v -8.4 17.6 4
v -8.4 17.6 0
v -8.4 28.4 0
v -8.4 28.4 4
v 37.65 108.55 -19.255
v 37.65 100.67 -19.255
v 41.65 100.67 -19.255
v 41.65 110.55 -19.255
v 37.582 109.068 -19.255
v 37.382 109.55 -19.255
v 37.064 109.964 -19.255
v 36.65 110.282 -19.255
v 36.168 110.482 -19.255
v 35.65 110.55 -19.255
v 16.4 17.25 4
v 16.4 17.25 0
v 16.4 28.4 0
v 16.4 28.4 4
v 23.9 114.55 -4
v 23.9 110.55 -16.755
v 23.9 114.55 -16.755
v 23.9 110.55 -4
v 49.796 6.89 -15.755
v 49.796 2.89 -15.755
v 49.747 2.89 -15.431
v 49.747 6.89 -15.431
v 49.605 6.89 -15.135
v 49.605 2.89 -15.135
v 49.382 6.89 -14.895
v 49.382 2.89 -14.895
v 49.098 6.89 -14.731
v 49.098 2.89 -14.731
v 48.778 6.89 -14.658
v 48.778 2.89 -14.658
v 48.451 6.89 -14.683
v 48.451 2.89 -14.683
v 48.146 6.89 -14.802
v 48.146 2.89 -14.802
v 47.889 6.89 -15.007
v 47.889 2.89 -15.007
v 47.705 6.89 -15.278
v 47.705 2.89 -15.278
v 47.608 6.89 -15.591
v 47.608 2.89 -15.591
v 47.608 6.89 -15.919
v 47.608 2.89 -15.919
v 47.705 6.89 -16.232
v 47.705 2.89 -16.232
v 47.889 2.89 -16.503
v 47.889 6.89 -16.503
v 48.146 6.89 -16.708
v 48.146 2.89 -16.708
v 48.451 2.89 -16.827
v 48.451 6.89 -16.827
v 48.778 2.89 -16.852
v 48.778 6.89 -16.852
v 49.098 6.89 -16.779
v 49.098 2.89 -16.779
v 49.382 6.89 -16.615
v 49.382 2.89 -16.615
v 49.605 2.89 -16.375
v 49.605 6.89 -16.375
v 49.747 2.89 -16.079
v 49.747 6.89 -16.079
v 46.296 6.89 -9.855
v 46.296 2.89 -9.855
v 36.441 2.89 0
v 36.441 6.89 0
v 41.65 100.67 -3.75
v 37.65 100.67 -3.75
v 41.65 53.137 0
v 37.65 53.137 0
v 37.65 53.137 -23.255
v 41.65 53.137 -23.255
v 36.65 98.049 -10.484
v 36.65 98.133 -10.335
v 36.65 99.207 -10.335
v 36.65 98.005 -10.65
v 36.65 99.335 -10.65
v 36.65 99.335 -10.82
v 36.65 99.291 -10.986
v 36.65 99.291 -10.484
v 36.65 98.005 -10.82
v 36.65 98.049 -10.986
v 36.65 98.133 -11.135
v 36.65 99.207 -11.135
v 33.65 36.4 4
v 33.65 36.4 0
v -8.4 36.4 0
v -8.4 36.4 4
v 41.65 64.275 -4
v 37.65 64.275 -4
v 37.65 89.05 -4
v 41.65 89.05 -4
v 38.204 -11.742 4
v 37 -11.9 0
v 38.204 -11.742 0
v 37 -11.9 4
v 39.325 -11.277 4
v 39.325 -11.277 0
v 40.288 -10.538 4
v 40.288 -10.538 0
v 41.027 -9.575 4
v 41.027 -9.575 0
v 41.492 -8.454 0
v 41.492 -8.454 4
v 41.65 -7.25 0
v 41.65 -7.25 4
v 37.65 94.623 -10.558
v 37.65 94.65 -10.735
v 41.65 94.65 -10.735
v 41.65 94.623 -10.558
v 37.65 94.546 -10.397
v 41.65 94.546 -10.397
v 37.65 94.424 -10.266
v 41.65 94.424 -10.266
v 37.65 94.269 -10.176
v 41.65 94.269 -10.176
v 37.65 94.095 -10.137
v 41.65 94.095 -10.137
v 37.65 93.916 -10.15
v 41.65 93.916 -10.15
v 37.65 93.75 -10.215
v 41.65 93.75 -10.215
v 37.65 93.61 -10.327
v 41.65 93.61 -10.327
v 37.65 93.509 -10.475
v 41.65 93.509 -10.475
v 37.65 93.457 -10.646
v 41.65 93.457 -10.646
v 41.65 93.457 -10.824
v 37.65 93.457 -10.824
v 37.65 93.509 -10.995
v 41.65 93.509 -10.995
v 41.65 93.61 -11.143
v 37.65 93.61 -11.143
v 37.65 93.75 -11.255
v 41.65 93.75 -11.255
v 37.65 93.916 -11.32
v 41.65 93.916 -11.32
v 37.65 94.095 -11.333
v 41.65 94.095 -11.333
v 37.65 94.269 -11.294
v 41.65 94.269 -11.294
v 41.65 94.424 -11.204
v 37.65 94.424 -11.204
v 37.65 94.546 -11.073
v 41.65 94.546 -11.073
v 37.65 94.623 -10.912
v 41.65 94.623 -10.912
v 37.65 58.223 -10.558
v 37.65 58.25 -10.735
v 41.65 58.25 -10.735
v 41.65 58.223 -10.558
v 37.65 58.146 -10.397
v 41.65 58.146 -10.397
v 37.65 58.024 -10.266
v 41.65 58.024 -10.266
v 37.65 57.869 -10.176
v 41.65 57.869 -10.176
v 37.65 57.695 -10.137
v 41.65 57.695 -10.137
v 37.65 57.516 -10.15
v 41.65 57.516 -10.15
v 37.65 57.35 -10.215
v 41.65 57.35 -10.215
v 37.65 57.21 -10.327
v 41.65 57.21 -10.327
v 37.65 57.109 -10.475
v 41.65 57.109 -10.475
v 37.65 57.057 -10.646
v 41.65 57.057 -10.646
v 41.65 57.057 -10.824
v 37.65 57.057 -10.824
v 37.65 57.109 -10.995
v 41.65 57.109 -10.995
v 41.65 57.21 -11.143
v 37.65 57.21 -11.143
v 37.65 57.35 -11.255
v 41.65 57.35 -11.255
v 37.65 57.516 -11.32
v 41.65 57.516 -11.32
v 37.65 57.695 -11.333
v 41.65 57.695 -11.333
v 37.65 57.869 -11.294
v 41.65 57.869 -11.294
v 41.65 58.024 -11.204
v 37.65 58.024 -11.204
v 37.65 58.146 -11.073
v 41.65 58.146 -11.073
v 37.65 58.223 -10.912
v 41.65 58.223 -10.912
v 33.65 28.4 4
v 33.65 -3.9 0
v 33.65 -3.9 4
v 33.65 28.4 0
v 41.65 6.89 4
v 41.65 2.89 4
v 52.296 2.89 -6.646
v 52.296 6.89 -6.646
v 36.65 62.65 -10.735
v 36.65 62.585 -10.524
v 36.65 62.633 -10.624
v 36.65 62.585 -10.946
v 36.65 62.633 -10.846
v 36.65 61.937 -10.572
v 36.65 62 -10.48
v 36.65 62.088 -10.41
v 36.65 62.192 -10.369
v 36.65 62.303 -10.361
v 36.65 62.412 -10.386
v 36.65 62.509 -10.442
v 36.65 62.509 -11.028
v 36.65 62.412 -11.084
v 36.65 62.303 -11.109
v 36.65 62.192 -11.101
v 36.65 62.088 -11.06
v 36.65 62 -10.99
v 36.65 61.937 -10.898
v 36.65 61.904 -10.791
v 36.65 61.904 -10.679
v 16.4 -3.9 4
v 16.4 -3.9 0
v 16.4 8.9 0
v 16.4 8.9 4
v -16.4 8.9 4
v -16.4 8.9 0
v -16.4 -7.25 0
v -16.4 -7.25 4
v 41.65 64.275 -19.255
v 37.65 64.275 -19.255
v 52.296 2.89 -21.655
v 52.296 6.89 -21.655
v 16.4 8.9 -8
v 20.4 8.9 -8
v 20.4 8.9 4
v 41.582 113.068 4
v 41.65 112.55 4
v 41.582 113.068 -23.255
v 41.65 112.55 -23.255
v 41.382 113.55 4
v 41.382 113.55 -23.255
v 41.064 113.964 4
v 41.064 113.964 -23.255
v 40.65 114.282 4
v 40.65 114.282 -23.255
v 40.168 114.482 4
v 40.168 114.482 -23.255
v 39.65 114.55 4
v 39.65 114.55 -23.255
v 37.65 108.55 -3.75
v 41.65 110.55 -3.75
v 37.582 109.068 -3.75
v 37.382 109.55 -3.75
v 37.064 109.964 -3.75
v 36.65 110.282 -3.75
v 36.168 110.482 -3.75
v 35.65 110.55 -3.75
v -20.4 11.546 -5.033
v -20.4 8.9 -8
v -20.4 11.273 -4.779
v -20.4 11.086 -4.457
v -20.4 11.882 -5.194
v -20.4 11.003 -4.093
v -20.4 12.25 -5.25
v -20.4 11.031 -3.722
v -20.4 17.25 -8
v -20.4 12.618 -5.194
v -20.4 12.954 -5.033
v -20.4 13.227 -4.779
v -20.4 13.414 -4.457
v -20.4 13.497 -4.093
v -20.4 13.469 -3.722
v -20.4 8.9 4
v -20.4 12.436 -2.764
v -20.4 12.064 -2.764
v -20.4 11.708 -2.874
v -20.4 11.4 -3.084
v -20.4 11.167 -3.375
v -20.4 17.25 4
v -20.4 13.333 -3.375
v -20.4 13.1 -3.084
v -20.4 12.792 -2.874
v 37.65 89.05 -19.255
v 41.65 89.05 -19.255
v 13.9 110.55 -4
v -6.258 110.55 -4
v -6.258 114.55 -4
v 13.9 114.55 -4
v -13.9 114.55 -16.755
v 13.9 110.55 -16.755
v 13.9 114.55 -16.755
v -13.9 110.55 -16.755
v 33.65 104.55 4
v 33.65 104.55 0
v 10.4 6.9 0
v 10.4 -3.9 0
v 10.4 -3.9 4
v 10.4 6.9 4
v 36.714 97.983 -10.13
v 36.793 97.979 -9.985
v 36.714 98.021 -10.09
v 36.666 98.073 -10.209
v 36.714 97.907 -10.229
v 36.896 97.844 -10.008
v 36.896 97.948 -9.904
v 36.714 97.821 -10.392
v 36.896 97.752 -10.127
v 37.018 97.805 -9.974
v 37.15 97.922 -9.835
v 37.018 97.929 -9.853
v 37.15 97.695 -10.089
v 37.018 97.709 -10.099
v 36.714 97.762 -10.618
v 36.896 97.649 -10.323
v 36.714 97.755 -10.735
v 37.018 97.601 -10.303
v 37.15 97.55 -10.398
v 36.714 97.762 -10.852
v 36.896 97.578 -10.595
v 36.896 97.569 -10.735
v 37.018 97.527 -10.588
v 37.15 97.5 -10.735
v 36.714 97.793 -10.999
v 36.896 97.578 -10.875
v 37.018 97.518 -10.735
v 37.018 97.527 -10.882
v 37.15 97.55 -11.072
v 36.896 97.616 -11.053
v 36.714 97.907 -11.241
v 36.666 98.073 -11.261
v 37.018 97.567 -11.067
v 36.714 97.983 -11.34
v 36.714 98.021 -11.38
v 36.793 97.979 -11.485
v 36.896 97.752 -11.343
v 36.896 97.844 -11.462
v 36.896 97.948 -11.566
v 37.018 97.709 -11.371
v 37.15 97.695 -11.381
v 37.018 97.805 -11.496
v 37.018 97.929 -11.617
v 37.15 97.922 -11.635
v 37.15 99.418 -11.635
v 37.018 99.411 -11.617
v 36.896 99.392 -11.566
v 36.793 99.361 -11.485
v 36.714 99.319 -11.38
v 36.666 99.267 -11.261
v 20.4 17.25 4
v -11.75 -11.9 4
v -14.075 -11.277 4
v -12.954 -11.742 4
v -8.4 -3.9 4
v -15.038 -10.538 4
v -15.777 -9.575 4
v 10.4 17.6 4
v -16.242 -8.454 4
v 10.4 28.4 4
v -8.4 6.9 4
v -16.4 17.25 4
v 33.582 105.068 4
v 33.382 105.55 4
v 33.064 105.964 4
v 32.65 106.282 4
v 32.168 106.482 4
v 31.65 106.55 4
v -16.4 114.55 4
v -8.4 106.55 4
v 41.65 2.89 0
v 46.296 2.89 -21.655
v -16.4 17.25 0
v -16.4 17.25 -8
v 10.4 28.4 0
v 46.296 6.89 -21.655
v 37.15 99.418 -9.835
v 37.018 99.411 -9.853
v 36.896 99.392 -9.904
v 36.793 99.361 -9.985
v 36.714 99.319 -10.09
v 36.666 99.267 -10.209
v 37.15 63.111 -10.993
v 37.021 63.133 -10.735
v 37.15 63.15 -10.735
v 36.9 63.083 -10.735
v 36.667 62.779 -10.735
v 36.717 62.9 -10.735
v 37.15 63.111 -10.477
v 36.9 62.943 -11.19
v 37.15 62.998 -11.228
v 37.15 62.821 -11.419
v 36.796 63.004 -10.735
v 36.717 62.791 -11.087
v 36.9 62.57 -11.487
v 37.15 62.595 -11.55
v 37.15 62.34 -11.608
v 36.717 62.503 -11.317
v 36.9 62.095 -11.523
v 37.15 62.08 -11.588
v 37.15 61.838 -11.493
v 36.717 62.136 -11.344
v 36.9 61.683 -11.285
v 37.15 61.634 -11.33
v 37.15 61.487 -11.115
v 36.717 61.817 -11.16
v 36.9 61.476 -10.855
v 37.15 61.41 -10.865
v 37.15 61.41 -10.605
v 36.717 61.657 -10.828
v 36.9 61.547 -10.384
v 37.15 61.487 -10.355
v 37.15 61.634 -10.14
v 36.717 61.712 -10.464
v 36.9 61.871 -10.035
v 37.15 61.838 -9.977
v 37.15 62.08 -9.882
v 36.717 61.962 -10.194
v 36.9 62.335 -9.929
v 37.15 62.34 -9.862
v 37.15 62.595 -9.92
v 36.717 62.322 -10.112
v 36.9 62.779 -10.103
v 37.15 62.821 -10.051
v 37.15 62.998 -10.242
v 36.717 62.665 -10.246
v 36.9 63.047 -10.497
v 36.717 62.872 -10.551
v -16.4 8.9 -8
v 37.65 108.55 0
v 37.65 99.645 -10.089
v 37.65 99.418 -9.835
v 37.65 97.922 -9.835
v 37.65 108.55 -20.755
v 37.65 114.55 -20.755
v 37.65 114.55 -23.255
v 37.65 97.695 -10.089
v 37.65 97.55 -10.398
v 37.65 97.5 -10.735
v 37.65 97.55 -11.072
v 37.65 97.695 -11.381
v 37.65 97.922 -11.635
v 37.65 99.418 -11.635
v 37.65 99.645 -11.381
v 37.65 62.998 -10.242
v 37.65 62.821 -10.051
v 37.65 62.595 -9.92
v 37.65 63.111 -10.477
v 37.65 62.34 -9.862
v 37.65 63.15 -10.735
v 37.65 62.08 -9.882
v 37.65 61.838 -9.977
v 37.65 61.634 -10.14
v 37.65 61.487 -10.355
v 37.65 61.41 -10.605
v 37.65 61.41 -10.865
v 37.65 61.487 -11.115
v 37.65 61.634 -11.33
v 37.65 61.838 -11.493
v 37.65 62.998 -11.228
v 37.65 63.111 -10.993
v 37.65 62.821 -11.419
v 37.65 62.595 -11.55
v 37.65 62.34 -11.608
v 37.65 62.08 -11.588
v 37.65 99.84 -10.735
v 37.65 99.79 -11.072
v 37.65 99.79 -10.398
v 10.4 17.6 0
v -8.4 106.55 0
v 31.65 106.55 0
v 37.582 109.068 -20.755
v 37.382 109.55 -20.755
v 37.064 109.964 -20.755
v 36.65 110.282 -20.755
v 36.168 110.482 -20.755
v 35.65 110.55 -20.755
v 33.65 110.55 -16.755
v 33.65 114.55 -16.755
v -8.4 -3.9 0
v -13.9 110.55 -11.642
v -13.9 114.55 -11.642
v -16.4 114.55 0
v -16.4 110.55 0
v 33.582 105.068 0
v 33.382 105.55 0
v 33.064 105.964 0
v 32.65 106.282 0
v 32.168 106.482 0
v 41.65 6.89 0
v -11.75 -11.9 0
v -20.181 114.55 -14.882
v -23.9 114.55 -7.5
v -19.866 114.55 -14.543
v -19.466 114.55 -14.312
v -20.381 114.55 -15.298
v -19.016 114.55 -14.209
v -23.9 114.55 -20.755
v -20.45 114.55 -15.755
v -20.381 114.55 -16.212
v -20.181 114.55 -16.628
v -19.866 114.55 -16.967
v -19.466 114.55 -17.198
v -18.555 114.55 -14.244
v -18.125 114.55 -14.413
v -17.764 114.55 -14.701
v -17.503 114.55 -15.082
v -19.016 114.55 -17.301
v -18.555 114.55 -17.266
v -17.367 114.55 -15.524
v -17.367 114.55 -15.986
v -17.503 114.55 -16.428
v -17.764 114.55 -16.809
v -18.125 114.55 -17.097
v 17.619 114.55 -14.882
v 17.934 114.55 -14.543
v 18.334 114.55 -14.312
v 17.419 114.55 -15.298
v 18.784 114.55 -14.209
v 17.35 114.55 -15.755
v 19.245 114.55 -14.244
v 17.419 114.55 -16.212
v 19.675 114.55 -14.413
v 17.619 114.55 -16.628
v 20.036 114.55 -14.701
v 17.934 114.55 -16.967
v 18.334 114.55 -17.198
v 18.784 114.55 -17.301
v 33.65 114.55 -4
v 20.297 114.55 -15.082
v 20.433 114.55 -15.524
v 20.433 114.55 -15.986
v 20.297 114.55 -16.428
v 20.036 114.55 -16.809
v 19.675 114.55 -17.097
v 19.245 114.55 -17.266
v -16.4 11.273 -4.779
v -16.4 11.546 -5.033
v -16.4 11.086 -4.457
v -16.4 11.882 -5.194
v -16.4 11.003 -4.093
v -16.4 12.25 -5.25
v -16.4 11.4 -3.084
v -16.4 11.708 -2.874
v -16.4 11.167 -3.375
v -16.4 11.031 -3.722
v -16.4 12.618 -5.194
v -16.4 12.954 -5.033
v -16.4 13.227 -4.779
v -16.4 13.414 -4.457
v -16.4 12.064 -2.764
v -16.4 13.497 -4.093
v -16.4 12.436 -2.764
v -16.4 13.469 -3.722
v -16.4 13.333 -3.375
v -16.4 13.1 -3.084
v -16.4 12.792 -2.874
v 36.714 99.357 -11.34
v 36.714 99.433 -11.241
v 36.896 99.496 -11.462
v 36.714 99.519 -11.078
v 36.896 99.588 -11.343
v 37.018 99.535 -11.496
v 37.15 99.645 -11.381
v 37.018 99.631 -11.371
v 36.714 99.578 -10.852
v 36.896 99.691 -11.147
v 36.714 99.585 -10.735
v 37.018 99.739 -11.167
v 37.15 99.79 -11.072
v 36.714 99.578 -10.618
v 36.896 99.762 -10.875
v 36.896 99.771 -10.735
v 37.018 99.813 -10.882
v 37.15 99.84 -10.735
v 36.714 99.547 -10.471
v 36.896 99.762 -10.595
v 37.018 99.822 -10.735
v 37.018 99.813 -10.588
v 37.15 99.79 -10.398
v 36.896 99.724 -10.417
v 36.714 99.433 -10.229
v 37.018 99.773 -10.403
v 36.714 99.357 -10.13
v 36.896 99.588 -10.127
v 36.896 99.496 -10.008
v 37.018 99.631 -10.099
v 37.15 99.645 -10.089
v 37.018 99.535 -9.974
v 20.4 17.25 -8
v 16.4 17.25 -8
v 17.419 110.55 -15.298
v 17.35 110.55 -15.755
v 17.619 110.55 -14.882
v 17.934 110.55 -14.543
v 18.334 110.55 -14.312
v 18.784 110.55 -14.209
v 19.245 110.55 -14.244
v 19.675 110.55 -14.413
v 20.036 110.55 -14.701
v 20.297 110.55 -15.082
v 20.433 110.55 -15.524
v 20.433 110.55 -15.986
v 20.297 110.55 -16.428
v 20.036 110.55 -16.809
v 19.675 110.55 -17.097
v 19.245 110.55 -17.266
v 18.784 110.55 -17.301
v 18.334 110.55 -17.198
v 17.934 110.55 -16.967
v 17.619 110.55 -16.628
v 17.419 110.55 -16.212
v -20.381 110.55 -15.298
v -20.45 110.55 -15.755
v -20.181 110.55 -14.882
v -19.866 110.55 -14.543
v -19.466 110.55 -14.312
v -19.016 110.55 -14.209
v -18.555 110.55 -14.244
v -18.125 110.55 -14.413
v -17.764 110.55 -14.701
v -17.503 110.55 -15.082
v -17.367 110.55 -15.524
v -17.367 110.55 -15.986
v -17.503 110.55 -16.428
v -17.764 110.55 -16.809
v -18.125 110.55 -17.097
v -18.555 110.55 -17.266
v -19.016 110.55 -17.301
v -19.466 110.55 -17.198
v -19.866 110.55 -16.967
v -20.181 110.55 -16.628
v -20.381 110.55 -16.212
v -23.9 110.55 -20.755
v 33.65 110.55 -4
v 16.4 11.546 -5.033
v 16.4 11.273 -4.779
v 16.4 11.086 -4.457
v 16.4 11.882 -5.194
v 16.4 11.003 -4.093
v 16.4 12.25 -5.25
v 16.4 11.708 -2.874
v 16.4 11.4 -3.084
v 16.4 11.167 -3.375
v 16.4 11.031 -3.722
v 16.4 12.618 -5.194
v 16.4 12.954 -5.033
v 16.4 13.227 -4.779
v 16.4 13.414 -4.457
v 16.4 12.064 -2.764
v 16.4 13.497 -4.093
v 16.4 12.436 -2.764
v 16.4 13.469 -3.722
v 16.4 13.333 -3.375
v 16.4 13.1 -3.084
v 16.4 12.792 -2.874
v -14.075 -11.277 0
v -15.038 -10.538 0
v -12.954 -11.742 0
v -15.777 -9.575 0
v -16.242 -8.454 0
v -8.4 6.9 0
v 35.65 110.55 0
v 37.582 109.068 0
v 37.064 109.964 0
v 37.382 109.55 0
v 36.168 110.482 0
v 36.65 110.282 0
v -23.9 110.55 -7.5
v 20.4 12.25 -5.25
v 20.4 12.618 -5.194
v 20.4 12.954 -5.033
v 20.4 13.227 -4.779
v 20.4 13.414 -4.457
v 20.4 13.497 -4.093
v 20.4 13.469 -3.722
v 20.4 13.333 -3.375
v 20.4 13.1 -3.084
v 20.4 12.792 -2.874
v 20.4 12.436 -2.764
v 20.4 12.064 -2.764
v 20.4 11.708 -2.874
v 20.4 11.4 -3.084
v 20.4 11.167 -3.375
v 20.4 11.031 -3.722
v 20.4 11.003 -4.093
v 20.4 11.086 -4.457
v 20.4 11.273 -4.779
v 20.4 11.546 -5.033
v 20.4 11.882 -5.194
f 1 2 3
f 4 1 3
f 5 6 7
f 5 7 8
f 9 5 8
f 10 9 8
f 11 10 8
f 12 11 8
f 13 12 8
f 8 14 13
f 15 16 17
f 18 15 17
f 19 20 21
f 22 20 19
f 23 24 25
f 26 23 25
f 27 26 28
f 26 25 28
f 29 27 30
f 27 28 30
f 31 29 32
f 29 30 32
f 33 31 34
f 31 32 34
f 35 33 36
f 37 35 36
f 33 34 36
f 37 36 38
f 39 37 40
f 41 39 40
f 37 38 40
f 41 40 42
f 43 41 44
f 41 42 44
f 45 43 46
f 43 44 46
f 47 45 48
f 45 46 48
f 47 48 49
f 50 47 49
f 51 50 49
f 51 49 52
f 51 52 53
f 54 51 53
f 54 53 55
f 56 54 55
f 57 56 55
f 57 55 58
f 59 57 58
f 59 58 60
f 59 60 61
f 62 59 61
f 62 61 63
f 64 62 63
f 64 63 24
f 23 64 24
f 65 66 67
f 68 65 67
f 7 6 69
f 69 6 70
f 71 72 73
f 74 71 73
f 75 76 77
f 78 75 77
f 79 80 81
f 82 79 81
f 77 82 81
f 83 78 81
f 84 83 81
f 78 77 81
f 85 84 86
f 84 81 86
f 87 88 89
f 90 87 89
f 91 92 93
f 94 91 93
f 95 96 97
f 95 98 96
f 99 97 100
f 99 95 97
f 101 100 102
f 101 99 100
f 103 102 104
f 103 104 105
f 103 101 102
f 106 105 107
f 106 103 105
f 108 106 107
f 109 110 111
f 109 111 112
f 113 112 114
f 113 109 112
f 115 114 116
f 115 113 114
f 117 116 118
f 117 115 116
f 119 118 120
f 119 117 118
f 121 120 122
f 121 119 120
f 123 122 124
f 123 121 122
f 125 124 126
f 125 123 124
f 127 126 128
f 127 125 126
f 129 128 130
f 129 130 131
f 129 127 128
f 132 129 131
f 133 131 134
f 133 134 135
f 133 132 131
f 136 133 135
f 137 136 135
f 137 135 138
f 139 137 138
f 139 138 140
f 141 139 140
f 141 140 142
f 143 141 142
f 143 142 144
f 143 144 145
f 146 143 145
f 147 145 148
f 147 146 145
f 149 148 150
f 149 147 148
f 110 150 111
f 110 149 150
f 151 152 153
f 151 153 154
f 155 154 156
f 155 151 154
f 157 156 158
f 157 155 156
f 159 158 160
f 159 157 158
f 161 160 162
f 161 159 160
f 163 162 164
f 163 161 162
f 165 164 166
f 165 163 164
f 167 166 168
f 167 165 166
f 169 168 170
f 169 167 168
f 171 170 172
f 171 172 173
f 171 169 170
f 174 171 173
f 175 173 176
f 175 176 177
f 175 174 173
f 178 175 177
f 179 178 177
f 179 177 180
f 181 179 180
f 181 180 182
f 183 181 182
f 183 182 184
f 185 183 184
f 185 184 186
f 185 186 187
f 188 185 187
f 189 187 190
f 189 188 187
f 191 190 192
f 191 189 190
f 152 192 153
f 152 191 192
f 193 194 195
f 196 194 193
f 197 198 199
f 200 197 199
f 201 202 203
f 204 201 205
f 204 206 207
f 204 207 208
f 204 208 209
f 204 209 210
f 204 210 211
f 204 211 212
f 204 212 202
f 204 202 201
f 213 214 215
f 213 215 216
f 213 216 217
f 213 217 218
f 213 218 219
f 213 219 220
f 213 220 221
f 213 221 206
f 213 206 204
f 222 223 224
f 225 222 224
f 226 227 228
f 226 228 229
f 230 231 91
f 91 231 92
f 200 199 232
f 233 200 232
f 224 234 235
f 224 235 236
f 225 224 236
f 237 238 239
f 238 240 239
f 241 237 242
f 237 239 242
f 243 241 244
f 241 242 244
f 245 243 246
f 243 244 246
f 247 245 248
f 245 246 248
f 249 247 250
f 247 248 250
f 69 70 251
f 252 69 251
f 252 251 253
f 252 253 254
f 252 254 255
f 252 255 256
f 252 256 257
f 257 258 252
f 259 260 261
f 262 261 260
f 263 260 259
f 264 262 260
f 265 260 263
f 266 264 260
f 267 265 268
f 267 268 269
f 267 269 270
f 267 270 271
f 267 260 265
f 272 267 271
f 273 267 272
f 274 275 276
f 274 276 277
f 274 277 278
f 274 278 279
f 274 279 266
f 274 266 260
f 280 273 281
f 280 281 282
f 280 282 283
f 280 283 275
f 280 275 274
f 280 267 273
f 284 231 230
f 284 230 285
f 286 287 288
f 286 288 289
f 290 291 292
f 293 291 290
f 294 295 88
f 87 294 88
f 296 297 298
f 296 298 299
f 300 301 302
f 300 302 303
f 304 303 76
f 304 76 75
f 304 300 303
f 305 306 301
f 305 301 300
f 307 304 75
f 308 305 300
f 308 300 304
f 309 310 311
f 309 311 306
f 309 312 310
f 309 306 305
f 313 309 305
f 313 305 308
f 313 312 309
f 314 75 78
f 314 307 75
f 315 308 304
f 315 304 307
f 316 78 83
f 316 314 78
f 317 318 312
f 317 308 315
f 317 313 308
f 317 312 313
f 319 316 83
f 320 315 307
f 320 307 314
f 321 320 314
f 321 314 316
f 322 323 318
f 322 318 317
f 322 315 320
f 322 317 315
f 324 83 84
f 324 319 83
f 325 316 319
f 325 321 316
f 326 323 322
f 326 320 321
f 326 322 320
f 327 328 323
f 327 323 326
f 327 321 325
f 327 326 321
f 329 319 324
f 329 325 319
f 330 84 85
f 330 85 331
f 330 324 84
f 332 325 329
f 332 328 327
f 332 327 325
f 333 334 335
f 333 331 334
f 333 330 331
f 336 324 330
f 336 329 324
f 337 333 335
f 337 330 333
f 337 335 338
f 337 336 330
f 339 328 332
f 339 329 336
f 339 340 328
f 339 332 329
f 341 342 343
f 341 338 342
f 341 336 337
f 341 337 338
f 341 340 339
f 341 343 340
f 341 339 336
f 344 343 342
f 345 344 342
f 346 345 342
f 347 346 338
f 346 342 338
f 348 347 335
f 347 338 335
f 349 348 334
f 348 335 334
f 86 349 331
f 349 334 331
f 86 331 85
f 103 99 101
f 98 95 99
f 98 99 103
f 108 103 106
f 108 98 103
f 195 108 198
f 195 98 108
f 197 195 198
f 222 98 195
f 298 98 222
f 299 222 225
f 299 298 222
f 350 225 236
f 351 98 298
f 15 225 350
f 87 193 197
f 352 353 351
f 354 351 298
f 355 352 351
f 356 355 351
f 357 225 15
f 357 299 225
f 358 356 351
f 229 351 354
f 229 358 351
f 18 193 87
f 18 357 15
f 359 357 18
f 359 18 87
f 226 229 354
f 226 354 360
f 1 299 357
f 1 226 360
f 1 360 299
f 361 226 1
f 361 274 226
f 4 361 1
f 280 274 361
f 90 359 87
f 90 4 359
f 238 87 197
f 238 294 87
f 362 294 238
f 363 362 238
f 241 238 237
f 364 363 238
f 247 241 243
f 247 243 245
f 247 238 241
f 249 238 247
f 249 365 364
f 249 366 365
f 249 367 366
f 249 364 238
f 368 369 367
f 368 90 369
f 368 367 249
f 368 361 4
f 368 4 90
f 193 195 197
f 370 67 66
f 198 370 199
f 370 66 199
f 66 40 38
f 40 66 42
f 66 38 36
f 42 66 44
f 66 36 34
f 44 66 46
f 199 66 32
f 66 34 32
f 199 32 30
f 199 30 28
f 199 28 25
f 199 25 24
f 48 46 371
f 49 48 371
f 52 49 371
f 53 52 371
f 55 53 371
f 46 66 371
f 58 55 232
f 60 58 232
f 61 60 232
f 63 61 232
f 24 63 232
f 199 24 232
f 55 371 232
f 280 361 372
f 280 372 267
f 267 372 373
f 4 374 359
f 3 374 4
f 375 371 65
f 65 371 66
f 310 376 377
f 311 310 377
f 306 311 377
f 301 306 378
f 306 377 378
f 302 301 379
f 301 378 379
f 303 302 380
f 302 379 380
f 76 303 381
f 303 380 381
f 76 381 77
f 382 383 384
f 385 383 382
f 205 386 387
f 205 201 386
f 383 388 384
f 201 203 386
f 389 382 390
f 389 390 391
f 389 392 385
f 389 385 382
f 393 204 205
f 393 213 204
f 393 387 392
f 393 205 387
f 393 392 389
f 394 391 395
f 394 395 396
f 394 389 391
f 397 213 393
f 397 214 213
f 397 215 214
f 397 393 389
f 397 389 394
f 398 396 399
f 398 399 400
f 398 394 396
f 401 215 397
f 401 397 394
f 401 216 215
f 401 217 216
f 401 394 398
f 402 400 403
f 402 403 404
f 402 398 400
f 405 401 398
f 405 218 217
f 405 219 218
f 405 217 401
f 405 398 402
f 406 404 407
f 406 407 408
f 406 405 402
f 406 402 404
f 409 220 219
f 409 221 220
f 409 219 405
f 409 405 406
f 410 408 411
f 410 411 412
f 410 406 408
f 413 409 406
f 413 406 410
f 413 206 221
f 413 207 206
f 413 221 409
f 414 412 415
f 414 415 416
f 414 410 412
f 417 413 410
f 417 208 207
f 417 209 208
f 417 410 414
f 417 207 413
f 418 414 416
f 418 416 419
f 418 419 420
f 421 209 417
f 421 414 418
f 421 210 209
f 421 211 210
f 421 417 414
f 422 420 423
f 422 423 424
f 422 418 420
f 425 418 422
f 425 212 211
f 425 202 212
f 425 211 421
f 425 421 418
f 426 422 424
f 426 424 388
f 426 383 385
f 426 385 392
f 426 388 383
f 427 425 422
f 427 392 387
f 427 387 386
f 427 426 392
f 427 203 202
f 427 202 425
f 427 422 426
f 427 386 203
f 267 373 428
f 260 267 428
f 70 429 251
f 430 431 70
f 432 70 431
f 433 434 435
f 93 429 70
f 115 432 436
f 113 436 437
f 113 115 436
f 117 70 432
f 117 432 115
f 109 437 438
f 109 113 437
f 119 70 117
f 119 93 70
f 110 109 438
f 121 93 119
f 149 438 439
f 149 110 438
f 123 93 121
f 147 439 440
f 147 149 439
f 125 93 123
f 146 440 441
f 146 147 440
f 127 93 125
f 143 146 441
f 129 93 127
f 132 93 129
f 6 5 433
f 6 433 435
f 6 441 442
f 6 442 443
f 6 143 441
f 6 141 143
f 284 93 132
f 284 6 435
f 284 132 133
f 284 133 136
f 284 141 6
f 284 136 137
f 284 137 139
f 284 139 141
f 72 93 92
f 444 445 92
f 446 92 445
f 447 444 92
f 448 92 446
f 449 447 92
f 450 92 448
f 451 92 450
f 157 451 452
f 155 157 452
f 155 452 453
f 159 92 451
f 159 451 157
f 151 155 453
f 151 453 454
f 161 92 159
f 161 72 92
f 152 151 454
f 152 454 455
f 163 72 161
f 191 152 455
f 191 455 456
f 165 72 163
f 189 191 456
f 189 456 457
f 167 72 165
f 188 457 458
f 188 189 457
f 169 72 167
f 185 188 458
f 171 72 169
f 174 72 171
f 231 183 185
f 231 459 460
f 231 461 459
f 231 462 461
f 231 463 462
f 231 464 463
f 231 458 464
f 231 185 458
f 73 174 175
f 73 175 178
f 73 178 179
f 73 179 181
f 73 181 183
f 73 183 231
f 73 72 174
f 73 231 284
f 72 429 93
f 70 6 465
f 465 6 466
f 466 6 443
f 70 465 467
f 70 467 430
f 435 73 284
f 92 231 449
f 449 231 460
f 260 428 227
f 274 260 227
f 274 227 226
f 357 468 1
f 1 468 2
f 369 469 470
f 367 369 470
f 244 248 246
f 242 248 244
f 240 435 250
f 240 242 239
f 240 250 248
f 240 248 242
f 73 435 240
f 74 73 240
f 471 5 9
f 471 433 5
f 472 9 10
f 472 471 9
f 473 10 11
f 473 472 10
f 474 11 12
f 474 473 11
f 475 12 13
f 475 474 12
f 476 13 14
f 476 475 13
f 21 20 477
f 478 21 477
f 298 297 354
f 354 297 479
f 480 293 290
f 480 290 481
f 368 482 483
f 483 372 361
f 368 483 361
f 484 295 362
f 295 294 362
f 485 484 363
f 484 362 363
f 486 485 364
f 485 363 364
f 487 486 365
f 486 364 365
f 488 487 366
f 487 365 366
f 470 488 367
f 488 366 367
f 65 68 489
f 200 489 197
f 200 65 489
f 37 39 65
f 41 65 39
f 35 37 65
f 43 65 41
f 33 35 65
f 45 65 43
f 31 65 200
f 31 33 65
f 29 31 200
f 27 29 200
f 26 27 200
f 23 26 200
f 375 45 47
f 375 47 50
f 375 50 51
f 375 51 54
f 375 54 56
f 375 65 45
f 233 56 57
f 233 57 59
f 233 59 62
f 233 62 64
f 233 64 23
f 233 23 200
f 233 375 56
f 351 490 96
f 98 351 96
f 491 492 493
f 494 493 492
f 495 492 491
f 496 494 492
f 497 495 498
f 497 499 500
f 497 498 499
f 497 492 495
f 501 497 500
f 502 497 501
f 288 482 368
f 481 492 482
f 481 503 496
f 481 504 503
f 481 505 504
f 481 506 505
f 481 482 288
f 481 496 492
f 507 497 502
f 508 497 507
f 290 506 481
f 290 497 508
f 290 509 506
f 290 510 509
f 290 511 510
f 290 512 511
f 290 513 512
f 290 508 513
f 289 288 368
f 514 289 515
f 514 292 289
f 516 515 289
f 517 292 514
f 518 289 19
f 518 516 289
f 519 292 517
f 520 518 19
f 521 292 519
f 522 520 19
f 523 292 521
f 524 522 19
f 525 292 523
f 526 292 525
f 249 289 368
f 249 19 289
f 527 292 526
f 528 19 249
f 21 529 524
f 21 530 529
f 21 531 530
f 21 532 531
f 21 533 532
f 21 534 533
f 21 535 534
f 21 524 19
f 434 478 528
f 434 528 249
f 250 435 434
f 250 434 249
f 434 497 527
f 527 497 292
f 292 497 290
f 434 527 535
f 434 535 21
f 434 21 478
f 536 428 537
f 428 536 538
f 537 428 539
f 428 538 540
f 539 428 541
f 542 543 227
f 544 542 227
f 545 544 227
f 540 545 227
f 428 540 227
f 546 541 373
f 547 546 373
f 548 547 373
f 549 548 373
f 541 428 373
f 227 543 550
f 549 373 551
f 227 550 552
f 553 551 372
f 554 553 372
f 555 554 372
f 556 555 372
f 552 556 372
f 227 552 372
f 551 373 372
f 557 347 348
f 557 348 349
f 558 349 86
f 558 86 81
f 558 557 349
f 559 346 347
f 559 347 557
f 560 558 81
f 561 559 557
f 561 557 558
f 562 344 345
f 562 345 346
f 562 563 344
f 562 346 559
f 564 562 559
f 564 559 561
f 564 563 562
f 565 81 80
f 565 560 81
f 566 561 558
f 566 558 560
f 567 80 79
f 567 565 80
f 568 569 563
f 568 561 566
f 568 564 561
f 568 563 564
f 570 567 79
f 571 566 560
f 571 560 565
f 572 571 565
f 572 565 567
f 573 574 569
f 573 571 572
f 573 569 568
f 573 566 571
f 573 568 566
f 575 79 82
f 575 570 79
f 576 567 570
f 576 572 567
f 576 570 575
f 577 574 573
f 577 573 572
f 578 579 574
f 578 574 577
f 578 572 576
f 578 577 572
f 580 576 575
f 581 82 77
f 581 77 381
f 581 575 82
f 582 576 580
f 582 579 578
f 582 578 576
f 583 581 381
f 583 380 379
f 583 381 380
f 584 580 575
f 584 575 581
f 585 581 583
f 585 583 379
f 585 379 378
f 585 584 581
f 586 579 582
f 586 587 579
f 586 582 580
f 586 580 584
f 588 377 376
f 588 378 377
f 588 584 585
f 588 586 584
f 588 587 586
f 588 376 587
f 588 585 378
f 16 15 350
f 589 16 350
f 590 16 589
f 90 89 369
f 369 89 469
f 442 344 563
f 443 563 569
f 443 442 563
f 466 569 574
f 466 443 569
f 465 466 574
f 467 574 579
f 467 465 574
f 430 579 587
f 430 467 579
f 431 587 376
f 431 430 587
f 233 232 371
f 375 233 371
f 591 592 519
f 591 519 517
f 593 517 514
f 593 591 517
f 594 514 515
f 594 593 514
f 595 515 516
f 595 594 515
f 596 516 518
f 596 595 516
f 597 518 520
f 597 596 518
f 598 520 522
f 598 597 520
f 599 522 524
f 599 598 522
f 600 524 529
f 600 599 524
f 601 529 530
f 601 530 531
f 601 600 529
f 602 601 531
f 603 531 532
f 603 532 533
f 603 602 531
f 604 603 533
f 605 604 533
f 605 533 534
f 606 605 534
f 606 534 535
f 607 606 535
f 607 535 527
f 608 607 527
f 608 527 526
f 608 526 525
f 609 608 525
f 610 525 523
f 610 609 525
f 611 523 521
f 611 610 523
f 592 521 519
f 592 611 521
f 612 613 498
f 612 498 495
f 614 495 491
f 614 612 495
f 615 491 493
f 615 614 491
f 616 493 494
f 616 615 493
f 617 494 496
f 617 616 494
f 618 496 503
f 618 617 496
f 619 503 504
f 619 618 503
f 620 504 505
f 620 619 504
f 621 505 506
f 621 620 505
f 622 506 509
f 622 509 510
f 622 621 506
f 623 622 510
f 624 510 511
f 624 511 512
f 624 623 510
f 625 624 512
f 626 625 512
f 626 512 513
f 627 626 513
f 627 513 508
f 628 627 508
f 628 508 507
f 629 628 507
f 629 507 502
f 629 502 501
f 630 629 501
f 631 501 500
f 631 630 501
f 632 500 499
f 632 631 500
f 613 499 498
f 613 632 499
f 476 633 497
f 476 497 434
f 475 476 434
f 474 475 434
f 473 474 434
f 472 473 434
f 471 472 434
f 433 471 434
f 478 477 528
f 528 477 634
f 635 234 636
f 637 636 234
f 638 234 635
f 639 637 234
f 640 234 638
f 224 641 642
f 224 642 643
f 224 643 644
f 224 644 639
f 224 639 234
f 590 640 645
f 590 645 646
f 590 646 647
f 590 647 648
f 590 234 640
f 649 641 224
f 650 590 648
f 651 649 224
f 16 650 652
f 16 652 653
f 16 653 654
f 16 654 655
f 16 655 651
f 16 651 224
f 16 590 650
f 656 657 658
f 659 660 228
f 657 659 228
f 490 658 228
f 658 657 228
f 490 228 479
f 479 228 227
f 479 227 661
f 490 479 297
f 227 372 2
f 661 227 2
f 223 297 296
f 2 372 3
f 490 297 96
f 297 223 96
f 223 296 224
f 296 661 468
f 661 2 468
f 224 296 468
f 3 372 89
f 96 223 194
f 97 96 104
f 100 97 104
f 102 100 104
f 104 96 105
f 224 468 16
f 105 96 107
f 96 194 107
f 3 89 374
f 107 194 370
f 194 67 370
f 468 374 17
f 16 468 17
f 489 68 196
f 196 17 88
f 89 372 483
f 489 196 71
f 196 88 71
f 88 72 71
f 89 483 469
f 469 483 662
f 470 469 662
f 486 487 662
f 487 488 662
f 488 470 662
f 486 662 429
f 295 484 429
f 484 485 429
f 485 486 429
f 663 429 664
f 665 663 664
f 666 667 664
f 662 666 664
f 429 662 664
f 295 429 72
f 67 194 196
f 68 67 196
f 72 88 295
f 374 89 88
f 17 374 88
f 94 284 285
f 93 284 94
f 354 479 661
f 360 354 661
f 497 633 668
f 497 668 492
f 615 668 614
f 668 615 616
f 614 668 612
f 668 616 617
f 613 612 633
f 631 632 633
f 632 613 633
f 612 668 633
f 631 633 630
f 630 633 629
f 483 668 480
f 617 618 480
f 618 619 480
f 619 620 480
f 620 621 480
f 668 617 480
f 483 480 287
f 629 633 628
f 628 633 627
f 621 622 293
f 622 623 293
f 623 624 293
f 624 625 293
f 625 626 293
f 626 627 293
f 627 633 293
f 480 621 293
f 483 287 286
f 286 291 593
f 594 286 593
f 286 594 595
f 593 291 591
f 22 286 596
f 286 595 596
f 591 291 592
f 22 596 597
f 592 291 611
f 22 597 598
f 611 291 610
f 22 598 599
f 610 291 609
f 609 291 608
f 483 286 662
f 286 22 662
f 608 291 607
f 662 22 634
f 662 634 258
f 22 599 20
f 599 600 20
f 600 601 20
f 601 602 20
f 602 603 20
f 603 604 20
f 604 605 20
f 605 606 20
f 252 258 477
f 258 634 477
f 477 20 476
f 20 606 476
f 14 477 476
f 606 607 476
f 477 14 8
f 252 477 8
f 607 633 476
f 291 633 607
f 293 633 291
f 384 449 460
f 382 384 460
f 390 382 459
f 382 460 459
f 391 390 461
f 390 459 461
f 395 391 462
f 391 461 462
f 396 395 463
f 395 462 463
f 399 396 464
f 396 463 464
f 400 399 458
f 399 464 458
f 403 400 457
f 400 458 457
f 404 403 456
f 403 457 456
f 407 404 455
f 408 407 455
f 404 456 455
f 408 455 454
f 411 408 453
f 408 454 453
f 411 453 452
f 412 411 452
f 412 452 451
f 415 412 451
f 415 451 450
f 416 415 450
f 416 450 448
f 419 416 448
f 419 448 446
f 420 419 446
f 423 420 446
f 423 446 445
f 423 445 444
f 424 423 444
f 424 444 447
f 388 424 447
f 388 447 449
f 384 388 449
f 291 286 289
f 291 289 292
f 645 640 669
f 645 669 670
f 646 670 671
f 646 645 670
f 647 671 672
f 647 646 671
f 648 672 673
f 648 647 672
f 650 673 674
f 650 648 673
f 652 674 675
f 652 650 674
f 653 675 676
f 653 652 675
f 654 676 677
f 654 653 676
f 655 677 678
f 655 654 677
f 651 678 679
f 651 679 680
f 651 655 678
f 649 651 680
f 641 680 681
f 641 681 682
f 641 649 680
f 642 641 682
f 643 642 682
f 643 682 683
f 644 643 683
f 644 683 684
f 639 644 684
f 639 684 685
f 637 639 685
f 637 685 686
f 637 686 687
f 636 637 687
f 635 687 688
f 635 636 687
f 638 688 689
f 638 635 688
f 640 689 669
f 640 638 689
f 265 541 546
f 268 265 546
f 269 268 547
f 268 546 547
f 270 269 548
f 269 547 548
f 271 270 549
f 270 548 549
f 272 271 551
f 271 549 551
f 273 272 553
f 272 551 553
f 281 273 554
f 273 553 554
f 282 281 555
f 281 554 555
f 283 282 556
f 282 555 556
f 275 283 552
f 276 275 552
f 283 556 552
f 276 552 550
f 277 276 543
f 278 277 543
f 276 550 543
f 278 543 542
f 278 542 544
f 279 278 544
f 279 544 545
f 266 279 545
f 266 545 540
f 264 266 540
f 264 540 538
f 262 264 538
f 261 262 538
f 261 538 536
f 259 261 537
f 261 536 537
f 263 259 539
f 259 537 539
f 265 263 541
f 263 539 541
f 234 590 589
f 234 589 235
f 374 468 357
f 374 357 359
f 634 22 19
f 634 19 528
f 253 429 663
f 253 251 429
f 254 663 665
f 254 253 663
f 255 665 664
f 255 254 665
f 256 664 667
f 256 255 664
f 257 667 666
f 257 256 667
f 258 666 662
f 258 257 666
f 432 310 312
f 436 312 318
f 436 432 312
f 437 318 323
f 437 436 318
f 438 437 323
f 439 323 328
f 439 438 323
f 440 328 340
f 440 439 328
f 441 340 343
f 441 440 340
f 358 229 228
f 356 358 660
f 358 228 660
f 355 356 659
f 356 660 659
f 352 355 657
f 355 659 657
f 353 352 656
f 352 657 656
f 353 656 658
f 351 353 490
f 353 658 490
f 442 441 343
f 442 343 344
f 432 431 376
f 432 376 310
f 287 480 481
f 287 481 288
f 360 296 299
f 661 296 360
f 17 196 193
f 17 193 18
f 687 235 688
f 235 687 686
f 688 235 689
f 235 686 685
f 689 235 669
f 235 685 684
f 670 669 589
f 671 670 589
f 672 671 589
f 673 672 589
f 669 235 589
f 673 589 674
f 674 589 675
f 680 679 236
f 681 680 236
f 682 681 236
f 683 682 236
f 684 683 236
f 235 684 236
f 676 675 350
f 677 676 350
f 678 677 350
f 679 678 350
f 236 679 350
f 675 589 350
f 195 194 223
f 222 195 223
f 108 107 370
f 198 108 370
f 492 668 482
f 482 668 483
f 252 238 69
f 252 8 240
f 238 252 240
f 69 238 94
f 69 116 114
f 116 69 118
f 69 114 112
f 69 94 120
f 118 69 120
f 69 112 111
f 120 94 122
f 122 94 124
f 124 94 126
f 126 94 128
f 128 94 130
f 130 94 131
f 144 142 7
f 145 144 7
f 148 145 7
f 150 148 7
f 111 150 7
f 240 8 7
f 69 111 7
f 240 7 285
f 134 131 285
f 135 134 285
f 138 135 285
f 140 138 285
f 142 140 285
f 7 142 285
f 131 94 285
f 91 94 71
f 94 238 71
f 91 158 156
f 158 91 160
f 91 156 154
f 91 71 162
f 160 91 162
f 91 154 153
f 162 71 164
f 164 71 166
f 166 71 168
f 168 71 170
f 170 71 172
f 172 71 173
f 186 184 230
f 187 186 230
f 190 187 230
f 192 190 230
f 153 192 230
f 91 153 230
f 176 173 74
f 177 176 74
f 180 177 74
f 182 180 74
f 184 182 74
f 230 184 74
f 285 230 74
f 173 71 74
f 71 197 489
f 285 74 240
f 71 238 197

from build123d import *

# Parameters (mm, degrees)
SKETCH_4_W          = 23.255
SKETCH_4_H          = 57.4134
SKETCH_4_R          = 0.6
EXTRUDE_5_DEPTH     = 4
SKETCH_5_W          = 65.55
SKETCH_5_H          = 20.755
SKETCH_5_R          = 1.55
EXTRUDE_6_DEPTH     = 4
SKETCH_7_W          = 65.55
SKETCH_7_H          = 126.45
EXTRUDE_8_DEPTH     = 4
SKETCH_11_W         = 17.25
SKETCH_11_H         = 32.3
SKETCH_11_W_2       = 18.8
SKETCH_11_H_2       = 10.8
CUT_EXTRUDE_3_DEPTH = 125.085535116
EXTRUDE_9_DEPTH     = 4
CUT_EXTRUDE_4_DEPTH = 10
SKETCH_14_W         = 9.75
SKETCH_14_H         = 12.755
CUT_EXTRUDE_5_DEPTH = 10
SKETCH_16_W         = 15.255
SKETCH_16_H         = 24.775
SKETCH_16_W_2       = 15.505
SKETCH_16_H_2       = 9.88
CUT_EXTRUDE_6_DEPTH = 133.101854737
SKETCH_17_R         = 0.875
EXTRUDE_10_DEPTH    = 1
FILLET_1_R          = 0.5
EXTRUDE_2_DEPTH     = 4
CUT_EXTRUDE_7_REACH = 127.473
SKETCH_19_R         = 1.1
SKETCH_21_W         = 4
SKETCH_21_H         = 2.5
EXTRUDE_11_DEPTH    = 4
FILLET_2_R          = 2
FILLET_3_R          = 4.65


with BuildPart() as part:
    # 草图4 → 凸台-拉伸5 (new body)
    with BuildSketch(Plane(origin=(37.65, 0, 0), x_dir=(0, 0, -1), z_dir=(1, 0, 0))):
        with Locations((11.6275, 81.8433)):
            Rectangle(SKETCH_4_W, SKETCH_4_H)
        with Locations(Location((10.735, 94.05, 0), (0, 0, 90))):
            Circle(SKETCH_4_R, mode=Mode.SUBTRACT)
        with Locations(Location((10.735, 57.65, 0), (0, 0, 90))):
            Circle(SKETCH_4_R, mode=Mode.SUBTRACT)
    extrude(amount=EXTRUDE_5_DEPTH)

    # 草图5 → 凸台-拉伸6 (add)
    with BuildSketch(Plane(origin=(0, 110.55, 0), x_dir=(1, 0, 0), z_dir=(0, 1, 0))):
        with Locations((8.875, 10.3775)):
            Rectangle(SKETCH_5_W, SKETCH_5_H)
        with Locations(Location((-18.9, 15.755, 0), (0, 0, 180))):
            Circle(SKETCH_5_R, mode=Mode.SUBTRACT)
        with Locations(Location((18.9, 15.755, 0), (0, 0, 180))):
            Circle(SKETCH_5_R, mode=Mode.SUBTRACT)
    extrude(amount=EXTRUDE_6_DEPTH)

    # 草图7 → 凸台-拉伸8 (add)
    with BuildSketch(Plane.XY):
        with Locations((8.875, 51.325)):
            Rectangle(SKETCH_7_W, SKETCH_7_H)
    extrude(amount=EXTRUDE_8_DEPTH)

    # 草图11 → 切除-拉伸3 (cut, through all)
    with BuildSketch(Plane(origin=(0, 0, 0), x_dir=(-1, 0, 0), z_dir=(0, 0, -1))):
        with Locations((-25.025, 12.25)):
            Rectangle(SKETCH_11_W, SKETCH_11_H)
        Polygon((-33.65, 106.55), (-33.65, 36.4), (-16.4, 36.4), (8.4, 36.4), (8.4, 106.55), align=None)
        with Locations((-1, 1.5)):
            Rectangle(SKETCH_11_W_2, SKETCH_11_H_2)
        with Locations((-1, 23)):
            Rectangle(SKETCH_11_W_2, SKETCH_11_H_2)
        with BuildLine():
            ThreePointArc((16.4, -7.25), (15.038046533, -10.538046533), (11.75, -11.9))
            Line((11.75, -11.9), (23.9, -11.9))
            Line((23.9, -11.9), (23.9, 106.55))
            Line((23.9, 106.55), (16.4, 106.55))
            Line((16.4, 106.55), (16.4, -7.25))
        make_face()
    extrude(amount=-CUT_EXTRUDE_3_DEPTH, mode=Mode.SUBTRACT)

    # 草图12 → 凸台-拉伸9 (add)
    with BuildSketch(Plane(origin=(0, 2.890336251, 0), x_dir=(1, 0, 0), z_dir=(0, 1, 0))):
        with BuildLine():
            Line((46.295757056, 9.855), (50.995757056, 9.855))
            Line((50.995757056, 9.855), (50.995757056, 15.105))
            Line((50.995757056, 15.105), (49.455691264, 15.105))
            ThreePointArc((49.455691264, 15.105), (47.695757056, 15.755), (49.455691264, 16.405))
            Line((49.455691264, 16.405), (50.995757056, 16.405))
            Line((50.995757056, 16.405), (50.995757056, 21.655))
            Line((50.995757056, 21.655), (46.295757056, 21.655))
            Line((46.295757056, 21.655), (46.295757056, 9.855))
        make_face()
        Polygon((52.295757056, 6.645757056), (52.295757056, 9.855), (50.995757056, 9.855), (46.295757056, 9.855), (36.440757056, 0), (41.65, -4), align=None)
        with BuildLine():
            Line((52.295757056, 9.855), (52.295757056, 21.655))
            Line((52.295757056, 21.655), (50.995757056, 21.655))
            Line((50.995757056, 21.655), (50.995757056, 16.405))
            Line((50.995757056, 16.405), (49.455691264, 16.405))
            ThreePointArc((49.455691264, 16.405), (47.695757056, 15.755), (49.455691264, 15.105))
            Line((49.455691264, 15.105), (50.995757056, 15.105))
            Line((50.995757056, 15.105), (50.995757056, 9.855))
            Line((50.995757056, 9.855), (52.295757056, 9.855))
        make_face()
    extrude(amount=EXTRUDE_9_DEPTH)

    # 草图13 → 切除-拉伸4 (cut, symmetric)
    with BuildSketch(Plane.XZ.offset(-110.55)):
        Polygon((-23.9, -7.5), (-16.4, 0), (-16.4, 4), (-23.9, 4), align=None)
    extrude(amount=CUT_EXTRUDE_4_DEPTH, both=True, mode=Mode.SUBTRACT)

    # 草图14 → 切除-拉伸5 (cut)
    with BuildSketch(Plane.XZ.offset(-110.55)):
        with Locations((28.775, -10.3775)):
            Rectangle(SKETCH_14_W, SKETCH_14_H)
        Polygon((13.9, -16.755), (-13.9, -16.755), (-13.9, -11.642135624), (-6.257864376, -4), (13.9, -4), align=None)
    extrude(amount=-CUT_EXTRUDE_5_DEPTH, mode=Mode.SUBTRACT)

    # 草图16 → 切除-拉伸6 (cut, through all)
    with BuildSketch(Plane.ZY.offset(-37.65)):
        with Locations((-11.6275, 76.6625)):
            Rectangle(SKETCH_16_W, SKETCH_16_H)
        with Locations((-11.5025, 105.61)):
            Rectangle(SKETCH_16_W_2, SKETCH_16_H_2)
    extrude(amount=-CUT_EXTRUDE_6_DEPTH, mode=Mode.SUBTRACT)

    # 草图17 → 凸台-拉伸10 (add)
    with BuildSketch(Plane.ZY.offset(-37.65)):
        with Locations(Location((-10.735, 62.275, 0), (0, 0, 90))):
            Circle(SKETCH_17_R)
        with BuildLine():
            Line((-11.635, 97.922403852), (-11.635, 99.417596148))
            ThreePointArc((-11.635, 99.417596148), (-10.735, 99.84), (-9.835, 99.417596148))
            Line((-9.835, 99.417596148), (-9.835, 97.922403852))
            ThreePointArc((-9.835, 97.922403852), (-10.735, 97.5), (-11.635, 97.922403852))
        make_face()
    extrude(amount=EXTRUDE_10_DEPTH)

    # 圆角1
    # the kernel refuses this fillet: 0.5 mm, written as the material it takes off along each edge
    with BuildSketch(Plane(origin=(36.65, 62.275, -10.735), x_dir=(0, 1, 0), z_dir=(0, 0, 1))) as fillet_1_piece_1:
        with BuildLine():
            CenterArc((0.875 - FILLET_1_R, -FILLET_1_R), FILLET_1_R, 0, 90)
            Line((0.875 - FILLET_1_R, 0), (0.875, 0))
            Line((0.875, 0), (0.875, -FILLET_1_R))
        make_face()
    revolve(axis=Axis((36.65, 62.275, -10.735), (-1, 0, 0)), mode=Mode.SUBTRACT)
    with BuildSketch(Plane(origin=(36.65, 96.672403852, -11.635), x_dir=(1, 0, 0), z_dir=(0, 1, 0)), Plane(origin=(36.65, 100.667596148, -9.835), x_dir=(1, 0, 0), z_dir=(0, -1, 0))) as fillet_1_piece_2:
        with BuildLine():
            CenterArc((FILLET_1_R, -FILLET_1_R), FILLET_1_R, 90, 90)
            Line((0, -FILLET_1_R), (0, 0))
            Line((0, 0), (FILLET_1_R, 0))
        make_face()
    extrude(amount=3.995192295, mode=Mode.SUBTRACT)
    with BuildSketch(Plane(origin=(36.65, 98.67, -10.735), x_dir=(0, 0.36697225923969184, 0.9302318855793519), z_dir=(0, 0.9302318855793519, -0.36697225923969184))) as fillet_1_piece_3:
        with BuildLine():
            CenterArc((1.17 - FILLET_1_R, FILLET_1_R), FILLET_1_R, 270, 90)
            Line((1.17 - FILLET_1_R, 0), (1.17, 0))
            Line((1.17, 0), (1.17, FILLET_1_R))
        make_face()
    revolve(axis=Axis((36.65, 98.67, -10.735), (1, 0, 0)), revolution_arc=223.058018827, mode=Mode.SUBTRACT)
    with BuildSketch(Plane(origin=(36.65, 98.67, -10.735), x_dir=(0, -0.36697225923969184, -0.9302318855793519), z_dir=(0, -0.9302318855793519, 0.36697225923969184))) as fillet_1_piece_4:
        with BuildLine():
            CenterArc((1.17 - FILLET_1_R, FILLET_1_R), FILLET_1_R, 270, 90)
            Line((1.17 - FILLET_1_R, 0), (1.17, 0))
            Line((1.17, 0), (1.17, FILLET_1_R))
        make_face()
    revolve(axis=Axis((36.65, 98.67, -10.735), (1, 0, 0)), revolution_arc=223.058018827, mode=Mode.SUBTRACT)

    # 草图2 → 凸台-拉伸2 (add)
    with BuildSketch(Plane.ZY.offset(16.4)):
        Polygon((-8, 12.25), (-8, 8.9), (4, 8.9), (4, 17.25), (-8, 17.25), align=None)
        with BuildLine():
            ThreePointArc((-2.75, 12.25), (-4, 11), (-5.25, 12.25))
            ThreePointArc((-5.25, 12.25), (-4, 13.5), (-2.75, 12.25))
        make_face(mode=Mode.SUBTRACT)
    extrude_2 = extrude(amount=EXTRUDE_2_DEPTH)

    # 镜向10: 凸台-拉伸2 across plane
    add(extrude_2.mirror(Plane(origin=(0, 0, 0), x_dir=(0, 0, 1), z_dir=(1, 0, 0))))

    # 草图19 → 切除-拉伸7 (cut, up to next)
    with BuildSketch(Plane.XZ.offset(-2.890336251), mode=Mode.PRIVATE) as cut_extrude_7_sk1:
        with Locations((48.695757056, -15.755)):
            Circle(SKETCH_19_R)
    cut_extrude_7_tool1 = extrude(cut_extrude_7_sk1.sketch, amount=-CUT_EXTRUDE_7_REACH, mode=Mode.PRIVATE) & part.part
    add(cut_extrude_7_tool1.solids().sort_by_distance((48.695757, 2.890336, -15.755))[0], mode=Mode.SUBTRACT)

    # 草图21 → 凸台-拉伸11 (add)
    with BuildSketch(Plane(origin=(0, 110.55, 0), x_dir=(1, 0, 0), z_dir=(0, 1, 0))):
        with Locations((39.65, 22.005)):
            Rectangle(SKETCH_21_W, SKETCH_21_H)
    extrude(amount=EXTRUDE_11_DEPTH)

    # 圆角2
    fillet_2_edges = [part.edges().sort_by_distance(p)[0] for p in [
        (33.65, 106.55, 2),
        (37.65, 110.55, -1.875),
        (37.65, 110.55, -20.005),
        (41.65, 114.55, -9.6275),
    ]]
    fillet(fillet_2_edges, radius=FILLET_2_R)

    # 圆角3
    fillet_3_edges = [part.edges().sort_by_distance(p)[0] for p in [
        (41.65, -11.9, 2),
    ]]
    fillet(fillet_3_edges, radius=FILLET_3_R)


solid = part.part
